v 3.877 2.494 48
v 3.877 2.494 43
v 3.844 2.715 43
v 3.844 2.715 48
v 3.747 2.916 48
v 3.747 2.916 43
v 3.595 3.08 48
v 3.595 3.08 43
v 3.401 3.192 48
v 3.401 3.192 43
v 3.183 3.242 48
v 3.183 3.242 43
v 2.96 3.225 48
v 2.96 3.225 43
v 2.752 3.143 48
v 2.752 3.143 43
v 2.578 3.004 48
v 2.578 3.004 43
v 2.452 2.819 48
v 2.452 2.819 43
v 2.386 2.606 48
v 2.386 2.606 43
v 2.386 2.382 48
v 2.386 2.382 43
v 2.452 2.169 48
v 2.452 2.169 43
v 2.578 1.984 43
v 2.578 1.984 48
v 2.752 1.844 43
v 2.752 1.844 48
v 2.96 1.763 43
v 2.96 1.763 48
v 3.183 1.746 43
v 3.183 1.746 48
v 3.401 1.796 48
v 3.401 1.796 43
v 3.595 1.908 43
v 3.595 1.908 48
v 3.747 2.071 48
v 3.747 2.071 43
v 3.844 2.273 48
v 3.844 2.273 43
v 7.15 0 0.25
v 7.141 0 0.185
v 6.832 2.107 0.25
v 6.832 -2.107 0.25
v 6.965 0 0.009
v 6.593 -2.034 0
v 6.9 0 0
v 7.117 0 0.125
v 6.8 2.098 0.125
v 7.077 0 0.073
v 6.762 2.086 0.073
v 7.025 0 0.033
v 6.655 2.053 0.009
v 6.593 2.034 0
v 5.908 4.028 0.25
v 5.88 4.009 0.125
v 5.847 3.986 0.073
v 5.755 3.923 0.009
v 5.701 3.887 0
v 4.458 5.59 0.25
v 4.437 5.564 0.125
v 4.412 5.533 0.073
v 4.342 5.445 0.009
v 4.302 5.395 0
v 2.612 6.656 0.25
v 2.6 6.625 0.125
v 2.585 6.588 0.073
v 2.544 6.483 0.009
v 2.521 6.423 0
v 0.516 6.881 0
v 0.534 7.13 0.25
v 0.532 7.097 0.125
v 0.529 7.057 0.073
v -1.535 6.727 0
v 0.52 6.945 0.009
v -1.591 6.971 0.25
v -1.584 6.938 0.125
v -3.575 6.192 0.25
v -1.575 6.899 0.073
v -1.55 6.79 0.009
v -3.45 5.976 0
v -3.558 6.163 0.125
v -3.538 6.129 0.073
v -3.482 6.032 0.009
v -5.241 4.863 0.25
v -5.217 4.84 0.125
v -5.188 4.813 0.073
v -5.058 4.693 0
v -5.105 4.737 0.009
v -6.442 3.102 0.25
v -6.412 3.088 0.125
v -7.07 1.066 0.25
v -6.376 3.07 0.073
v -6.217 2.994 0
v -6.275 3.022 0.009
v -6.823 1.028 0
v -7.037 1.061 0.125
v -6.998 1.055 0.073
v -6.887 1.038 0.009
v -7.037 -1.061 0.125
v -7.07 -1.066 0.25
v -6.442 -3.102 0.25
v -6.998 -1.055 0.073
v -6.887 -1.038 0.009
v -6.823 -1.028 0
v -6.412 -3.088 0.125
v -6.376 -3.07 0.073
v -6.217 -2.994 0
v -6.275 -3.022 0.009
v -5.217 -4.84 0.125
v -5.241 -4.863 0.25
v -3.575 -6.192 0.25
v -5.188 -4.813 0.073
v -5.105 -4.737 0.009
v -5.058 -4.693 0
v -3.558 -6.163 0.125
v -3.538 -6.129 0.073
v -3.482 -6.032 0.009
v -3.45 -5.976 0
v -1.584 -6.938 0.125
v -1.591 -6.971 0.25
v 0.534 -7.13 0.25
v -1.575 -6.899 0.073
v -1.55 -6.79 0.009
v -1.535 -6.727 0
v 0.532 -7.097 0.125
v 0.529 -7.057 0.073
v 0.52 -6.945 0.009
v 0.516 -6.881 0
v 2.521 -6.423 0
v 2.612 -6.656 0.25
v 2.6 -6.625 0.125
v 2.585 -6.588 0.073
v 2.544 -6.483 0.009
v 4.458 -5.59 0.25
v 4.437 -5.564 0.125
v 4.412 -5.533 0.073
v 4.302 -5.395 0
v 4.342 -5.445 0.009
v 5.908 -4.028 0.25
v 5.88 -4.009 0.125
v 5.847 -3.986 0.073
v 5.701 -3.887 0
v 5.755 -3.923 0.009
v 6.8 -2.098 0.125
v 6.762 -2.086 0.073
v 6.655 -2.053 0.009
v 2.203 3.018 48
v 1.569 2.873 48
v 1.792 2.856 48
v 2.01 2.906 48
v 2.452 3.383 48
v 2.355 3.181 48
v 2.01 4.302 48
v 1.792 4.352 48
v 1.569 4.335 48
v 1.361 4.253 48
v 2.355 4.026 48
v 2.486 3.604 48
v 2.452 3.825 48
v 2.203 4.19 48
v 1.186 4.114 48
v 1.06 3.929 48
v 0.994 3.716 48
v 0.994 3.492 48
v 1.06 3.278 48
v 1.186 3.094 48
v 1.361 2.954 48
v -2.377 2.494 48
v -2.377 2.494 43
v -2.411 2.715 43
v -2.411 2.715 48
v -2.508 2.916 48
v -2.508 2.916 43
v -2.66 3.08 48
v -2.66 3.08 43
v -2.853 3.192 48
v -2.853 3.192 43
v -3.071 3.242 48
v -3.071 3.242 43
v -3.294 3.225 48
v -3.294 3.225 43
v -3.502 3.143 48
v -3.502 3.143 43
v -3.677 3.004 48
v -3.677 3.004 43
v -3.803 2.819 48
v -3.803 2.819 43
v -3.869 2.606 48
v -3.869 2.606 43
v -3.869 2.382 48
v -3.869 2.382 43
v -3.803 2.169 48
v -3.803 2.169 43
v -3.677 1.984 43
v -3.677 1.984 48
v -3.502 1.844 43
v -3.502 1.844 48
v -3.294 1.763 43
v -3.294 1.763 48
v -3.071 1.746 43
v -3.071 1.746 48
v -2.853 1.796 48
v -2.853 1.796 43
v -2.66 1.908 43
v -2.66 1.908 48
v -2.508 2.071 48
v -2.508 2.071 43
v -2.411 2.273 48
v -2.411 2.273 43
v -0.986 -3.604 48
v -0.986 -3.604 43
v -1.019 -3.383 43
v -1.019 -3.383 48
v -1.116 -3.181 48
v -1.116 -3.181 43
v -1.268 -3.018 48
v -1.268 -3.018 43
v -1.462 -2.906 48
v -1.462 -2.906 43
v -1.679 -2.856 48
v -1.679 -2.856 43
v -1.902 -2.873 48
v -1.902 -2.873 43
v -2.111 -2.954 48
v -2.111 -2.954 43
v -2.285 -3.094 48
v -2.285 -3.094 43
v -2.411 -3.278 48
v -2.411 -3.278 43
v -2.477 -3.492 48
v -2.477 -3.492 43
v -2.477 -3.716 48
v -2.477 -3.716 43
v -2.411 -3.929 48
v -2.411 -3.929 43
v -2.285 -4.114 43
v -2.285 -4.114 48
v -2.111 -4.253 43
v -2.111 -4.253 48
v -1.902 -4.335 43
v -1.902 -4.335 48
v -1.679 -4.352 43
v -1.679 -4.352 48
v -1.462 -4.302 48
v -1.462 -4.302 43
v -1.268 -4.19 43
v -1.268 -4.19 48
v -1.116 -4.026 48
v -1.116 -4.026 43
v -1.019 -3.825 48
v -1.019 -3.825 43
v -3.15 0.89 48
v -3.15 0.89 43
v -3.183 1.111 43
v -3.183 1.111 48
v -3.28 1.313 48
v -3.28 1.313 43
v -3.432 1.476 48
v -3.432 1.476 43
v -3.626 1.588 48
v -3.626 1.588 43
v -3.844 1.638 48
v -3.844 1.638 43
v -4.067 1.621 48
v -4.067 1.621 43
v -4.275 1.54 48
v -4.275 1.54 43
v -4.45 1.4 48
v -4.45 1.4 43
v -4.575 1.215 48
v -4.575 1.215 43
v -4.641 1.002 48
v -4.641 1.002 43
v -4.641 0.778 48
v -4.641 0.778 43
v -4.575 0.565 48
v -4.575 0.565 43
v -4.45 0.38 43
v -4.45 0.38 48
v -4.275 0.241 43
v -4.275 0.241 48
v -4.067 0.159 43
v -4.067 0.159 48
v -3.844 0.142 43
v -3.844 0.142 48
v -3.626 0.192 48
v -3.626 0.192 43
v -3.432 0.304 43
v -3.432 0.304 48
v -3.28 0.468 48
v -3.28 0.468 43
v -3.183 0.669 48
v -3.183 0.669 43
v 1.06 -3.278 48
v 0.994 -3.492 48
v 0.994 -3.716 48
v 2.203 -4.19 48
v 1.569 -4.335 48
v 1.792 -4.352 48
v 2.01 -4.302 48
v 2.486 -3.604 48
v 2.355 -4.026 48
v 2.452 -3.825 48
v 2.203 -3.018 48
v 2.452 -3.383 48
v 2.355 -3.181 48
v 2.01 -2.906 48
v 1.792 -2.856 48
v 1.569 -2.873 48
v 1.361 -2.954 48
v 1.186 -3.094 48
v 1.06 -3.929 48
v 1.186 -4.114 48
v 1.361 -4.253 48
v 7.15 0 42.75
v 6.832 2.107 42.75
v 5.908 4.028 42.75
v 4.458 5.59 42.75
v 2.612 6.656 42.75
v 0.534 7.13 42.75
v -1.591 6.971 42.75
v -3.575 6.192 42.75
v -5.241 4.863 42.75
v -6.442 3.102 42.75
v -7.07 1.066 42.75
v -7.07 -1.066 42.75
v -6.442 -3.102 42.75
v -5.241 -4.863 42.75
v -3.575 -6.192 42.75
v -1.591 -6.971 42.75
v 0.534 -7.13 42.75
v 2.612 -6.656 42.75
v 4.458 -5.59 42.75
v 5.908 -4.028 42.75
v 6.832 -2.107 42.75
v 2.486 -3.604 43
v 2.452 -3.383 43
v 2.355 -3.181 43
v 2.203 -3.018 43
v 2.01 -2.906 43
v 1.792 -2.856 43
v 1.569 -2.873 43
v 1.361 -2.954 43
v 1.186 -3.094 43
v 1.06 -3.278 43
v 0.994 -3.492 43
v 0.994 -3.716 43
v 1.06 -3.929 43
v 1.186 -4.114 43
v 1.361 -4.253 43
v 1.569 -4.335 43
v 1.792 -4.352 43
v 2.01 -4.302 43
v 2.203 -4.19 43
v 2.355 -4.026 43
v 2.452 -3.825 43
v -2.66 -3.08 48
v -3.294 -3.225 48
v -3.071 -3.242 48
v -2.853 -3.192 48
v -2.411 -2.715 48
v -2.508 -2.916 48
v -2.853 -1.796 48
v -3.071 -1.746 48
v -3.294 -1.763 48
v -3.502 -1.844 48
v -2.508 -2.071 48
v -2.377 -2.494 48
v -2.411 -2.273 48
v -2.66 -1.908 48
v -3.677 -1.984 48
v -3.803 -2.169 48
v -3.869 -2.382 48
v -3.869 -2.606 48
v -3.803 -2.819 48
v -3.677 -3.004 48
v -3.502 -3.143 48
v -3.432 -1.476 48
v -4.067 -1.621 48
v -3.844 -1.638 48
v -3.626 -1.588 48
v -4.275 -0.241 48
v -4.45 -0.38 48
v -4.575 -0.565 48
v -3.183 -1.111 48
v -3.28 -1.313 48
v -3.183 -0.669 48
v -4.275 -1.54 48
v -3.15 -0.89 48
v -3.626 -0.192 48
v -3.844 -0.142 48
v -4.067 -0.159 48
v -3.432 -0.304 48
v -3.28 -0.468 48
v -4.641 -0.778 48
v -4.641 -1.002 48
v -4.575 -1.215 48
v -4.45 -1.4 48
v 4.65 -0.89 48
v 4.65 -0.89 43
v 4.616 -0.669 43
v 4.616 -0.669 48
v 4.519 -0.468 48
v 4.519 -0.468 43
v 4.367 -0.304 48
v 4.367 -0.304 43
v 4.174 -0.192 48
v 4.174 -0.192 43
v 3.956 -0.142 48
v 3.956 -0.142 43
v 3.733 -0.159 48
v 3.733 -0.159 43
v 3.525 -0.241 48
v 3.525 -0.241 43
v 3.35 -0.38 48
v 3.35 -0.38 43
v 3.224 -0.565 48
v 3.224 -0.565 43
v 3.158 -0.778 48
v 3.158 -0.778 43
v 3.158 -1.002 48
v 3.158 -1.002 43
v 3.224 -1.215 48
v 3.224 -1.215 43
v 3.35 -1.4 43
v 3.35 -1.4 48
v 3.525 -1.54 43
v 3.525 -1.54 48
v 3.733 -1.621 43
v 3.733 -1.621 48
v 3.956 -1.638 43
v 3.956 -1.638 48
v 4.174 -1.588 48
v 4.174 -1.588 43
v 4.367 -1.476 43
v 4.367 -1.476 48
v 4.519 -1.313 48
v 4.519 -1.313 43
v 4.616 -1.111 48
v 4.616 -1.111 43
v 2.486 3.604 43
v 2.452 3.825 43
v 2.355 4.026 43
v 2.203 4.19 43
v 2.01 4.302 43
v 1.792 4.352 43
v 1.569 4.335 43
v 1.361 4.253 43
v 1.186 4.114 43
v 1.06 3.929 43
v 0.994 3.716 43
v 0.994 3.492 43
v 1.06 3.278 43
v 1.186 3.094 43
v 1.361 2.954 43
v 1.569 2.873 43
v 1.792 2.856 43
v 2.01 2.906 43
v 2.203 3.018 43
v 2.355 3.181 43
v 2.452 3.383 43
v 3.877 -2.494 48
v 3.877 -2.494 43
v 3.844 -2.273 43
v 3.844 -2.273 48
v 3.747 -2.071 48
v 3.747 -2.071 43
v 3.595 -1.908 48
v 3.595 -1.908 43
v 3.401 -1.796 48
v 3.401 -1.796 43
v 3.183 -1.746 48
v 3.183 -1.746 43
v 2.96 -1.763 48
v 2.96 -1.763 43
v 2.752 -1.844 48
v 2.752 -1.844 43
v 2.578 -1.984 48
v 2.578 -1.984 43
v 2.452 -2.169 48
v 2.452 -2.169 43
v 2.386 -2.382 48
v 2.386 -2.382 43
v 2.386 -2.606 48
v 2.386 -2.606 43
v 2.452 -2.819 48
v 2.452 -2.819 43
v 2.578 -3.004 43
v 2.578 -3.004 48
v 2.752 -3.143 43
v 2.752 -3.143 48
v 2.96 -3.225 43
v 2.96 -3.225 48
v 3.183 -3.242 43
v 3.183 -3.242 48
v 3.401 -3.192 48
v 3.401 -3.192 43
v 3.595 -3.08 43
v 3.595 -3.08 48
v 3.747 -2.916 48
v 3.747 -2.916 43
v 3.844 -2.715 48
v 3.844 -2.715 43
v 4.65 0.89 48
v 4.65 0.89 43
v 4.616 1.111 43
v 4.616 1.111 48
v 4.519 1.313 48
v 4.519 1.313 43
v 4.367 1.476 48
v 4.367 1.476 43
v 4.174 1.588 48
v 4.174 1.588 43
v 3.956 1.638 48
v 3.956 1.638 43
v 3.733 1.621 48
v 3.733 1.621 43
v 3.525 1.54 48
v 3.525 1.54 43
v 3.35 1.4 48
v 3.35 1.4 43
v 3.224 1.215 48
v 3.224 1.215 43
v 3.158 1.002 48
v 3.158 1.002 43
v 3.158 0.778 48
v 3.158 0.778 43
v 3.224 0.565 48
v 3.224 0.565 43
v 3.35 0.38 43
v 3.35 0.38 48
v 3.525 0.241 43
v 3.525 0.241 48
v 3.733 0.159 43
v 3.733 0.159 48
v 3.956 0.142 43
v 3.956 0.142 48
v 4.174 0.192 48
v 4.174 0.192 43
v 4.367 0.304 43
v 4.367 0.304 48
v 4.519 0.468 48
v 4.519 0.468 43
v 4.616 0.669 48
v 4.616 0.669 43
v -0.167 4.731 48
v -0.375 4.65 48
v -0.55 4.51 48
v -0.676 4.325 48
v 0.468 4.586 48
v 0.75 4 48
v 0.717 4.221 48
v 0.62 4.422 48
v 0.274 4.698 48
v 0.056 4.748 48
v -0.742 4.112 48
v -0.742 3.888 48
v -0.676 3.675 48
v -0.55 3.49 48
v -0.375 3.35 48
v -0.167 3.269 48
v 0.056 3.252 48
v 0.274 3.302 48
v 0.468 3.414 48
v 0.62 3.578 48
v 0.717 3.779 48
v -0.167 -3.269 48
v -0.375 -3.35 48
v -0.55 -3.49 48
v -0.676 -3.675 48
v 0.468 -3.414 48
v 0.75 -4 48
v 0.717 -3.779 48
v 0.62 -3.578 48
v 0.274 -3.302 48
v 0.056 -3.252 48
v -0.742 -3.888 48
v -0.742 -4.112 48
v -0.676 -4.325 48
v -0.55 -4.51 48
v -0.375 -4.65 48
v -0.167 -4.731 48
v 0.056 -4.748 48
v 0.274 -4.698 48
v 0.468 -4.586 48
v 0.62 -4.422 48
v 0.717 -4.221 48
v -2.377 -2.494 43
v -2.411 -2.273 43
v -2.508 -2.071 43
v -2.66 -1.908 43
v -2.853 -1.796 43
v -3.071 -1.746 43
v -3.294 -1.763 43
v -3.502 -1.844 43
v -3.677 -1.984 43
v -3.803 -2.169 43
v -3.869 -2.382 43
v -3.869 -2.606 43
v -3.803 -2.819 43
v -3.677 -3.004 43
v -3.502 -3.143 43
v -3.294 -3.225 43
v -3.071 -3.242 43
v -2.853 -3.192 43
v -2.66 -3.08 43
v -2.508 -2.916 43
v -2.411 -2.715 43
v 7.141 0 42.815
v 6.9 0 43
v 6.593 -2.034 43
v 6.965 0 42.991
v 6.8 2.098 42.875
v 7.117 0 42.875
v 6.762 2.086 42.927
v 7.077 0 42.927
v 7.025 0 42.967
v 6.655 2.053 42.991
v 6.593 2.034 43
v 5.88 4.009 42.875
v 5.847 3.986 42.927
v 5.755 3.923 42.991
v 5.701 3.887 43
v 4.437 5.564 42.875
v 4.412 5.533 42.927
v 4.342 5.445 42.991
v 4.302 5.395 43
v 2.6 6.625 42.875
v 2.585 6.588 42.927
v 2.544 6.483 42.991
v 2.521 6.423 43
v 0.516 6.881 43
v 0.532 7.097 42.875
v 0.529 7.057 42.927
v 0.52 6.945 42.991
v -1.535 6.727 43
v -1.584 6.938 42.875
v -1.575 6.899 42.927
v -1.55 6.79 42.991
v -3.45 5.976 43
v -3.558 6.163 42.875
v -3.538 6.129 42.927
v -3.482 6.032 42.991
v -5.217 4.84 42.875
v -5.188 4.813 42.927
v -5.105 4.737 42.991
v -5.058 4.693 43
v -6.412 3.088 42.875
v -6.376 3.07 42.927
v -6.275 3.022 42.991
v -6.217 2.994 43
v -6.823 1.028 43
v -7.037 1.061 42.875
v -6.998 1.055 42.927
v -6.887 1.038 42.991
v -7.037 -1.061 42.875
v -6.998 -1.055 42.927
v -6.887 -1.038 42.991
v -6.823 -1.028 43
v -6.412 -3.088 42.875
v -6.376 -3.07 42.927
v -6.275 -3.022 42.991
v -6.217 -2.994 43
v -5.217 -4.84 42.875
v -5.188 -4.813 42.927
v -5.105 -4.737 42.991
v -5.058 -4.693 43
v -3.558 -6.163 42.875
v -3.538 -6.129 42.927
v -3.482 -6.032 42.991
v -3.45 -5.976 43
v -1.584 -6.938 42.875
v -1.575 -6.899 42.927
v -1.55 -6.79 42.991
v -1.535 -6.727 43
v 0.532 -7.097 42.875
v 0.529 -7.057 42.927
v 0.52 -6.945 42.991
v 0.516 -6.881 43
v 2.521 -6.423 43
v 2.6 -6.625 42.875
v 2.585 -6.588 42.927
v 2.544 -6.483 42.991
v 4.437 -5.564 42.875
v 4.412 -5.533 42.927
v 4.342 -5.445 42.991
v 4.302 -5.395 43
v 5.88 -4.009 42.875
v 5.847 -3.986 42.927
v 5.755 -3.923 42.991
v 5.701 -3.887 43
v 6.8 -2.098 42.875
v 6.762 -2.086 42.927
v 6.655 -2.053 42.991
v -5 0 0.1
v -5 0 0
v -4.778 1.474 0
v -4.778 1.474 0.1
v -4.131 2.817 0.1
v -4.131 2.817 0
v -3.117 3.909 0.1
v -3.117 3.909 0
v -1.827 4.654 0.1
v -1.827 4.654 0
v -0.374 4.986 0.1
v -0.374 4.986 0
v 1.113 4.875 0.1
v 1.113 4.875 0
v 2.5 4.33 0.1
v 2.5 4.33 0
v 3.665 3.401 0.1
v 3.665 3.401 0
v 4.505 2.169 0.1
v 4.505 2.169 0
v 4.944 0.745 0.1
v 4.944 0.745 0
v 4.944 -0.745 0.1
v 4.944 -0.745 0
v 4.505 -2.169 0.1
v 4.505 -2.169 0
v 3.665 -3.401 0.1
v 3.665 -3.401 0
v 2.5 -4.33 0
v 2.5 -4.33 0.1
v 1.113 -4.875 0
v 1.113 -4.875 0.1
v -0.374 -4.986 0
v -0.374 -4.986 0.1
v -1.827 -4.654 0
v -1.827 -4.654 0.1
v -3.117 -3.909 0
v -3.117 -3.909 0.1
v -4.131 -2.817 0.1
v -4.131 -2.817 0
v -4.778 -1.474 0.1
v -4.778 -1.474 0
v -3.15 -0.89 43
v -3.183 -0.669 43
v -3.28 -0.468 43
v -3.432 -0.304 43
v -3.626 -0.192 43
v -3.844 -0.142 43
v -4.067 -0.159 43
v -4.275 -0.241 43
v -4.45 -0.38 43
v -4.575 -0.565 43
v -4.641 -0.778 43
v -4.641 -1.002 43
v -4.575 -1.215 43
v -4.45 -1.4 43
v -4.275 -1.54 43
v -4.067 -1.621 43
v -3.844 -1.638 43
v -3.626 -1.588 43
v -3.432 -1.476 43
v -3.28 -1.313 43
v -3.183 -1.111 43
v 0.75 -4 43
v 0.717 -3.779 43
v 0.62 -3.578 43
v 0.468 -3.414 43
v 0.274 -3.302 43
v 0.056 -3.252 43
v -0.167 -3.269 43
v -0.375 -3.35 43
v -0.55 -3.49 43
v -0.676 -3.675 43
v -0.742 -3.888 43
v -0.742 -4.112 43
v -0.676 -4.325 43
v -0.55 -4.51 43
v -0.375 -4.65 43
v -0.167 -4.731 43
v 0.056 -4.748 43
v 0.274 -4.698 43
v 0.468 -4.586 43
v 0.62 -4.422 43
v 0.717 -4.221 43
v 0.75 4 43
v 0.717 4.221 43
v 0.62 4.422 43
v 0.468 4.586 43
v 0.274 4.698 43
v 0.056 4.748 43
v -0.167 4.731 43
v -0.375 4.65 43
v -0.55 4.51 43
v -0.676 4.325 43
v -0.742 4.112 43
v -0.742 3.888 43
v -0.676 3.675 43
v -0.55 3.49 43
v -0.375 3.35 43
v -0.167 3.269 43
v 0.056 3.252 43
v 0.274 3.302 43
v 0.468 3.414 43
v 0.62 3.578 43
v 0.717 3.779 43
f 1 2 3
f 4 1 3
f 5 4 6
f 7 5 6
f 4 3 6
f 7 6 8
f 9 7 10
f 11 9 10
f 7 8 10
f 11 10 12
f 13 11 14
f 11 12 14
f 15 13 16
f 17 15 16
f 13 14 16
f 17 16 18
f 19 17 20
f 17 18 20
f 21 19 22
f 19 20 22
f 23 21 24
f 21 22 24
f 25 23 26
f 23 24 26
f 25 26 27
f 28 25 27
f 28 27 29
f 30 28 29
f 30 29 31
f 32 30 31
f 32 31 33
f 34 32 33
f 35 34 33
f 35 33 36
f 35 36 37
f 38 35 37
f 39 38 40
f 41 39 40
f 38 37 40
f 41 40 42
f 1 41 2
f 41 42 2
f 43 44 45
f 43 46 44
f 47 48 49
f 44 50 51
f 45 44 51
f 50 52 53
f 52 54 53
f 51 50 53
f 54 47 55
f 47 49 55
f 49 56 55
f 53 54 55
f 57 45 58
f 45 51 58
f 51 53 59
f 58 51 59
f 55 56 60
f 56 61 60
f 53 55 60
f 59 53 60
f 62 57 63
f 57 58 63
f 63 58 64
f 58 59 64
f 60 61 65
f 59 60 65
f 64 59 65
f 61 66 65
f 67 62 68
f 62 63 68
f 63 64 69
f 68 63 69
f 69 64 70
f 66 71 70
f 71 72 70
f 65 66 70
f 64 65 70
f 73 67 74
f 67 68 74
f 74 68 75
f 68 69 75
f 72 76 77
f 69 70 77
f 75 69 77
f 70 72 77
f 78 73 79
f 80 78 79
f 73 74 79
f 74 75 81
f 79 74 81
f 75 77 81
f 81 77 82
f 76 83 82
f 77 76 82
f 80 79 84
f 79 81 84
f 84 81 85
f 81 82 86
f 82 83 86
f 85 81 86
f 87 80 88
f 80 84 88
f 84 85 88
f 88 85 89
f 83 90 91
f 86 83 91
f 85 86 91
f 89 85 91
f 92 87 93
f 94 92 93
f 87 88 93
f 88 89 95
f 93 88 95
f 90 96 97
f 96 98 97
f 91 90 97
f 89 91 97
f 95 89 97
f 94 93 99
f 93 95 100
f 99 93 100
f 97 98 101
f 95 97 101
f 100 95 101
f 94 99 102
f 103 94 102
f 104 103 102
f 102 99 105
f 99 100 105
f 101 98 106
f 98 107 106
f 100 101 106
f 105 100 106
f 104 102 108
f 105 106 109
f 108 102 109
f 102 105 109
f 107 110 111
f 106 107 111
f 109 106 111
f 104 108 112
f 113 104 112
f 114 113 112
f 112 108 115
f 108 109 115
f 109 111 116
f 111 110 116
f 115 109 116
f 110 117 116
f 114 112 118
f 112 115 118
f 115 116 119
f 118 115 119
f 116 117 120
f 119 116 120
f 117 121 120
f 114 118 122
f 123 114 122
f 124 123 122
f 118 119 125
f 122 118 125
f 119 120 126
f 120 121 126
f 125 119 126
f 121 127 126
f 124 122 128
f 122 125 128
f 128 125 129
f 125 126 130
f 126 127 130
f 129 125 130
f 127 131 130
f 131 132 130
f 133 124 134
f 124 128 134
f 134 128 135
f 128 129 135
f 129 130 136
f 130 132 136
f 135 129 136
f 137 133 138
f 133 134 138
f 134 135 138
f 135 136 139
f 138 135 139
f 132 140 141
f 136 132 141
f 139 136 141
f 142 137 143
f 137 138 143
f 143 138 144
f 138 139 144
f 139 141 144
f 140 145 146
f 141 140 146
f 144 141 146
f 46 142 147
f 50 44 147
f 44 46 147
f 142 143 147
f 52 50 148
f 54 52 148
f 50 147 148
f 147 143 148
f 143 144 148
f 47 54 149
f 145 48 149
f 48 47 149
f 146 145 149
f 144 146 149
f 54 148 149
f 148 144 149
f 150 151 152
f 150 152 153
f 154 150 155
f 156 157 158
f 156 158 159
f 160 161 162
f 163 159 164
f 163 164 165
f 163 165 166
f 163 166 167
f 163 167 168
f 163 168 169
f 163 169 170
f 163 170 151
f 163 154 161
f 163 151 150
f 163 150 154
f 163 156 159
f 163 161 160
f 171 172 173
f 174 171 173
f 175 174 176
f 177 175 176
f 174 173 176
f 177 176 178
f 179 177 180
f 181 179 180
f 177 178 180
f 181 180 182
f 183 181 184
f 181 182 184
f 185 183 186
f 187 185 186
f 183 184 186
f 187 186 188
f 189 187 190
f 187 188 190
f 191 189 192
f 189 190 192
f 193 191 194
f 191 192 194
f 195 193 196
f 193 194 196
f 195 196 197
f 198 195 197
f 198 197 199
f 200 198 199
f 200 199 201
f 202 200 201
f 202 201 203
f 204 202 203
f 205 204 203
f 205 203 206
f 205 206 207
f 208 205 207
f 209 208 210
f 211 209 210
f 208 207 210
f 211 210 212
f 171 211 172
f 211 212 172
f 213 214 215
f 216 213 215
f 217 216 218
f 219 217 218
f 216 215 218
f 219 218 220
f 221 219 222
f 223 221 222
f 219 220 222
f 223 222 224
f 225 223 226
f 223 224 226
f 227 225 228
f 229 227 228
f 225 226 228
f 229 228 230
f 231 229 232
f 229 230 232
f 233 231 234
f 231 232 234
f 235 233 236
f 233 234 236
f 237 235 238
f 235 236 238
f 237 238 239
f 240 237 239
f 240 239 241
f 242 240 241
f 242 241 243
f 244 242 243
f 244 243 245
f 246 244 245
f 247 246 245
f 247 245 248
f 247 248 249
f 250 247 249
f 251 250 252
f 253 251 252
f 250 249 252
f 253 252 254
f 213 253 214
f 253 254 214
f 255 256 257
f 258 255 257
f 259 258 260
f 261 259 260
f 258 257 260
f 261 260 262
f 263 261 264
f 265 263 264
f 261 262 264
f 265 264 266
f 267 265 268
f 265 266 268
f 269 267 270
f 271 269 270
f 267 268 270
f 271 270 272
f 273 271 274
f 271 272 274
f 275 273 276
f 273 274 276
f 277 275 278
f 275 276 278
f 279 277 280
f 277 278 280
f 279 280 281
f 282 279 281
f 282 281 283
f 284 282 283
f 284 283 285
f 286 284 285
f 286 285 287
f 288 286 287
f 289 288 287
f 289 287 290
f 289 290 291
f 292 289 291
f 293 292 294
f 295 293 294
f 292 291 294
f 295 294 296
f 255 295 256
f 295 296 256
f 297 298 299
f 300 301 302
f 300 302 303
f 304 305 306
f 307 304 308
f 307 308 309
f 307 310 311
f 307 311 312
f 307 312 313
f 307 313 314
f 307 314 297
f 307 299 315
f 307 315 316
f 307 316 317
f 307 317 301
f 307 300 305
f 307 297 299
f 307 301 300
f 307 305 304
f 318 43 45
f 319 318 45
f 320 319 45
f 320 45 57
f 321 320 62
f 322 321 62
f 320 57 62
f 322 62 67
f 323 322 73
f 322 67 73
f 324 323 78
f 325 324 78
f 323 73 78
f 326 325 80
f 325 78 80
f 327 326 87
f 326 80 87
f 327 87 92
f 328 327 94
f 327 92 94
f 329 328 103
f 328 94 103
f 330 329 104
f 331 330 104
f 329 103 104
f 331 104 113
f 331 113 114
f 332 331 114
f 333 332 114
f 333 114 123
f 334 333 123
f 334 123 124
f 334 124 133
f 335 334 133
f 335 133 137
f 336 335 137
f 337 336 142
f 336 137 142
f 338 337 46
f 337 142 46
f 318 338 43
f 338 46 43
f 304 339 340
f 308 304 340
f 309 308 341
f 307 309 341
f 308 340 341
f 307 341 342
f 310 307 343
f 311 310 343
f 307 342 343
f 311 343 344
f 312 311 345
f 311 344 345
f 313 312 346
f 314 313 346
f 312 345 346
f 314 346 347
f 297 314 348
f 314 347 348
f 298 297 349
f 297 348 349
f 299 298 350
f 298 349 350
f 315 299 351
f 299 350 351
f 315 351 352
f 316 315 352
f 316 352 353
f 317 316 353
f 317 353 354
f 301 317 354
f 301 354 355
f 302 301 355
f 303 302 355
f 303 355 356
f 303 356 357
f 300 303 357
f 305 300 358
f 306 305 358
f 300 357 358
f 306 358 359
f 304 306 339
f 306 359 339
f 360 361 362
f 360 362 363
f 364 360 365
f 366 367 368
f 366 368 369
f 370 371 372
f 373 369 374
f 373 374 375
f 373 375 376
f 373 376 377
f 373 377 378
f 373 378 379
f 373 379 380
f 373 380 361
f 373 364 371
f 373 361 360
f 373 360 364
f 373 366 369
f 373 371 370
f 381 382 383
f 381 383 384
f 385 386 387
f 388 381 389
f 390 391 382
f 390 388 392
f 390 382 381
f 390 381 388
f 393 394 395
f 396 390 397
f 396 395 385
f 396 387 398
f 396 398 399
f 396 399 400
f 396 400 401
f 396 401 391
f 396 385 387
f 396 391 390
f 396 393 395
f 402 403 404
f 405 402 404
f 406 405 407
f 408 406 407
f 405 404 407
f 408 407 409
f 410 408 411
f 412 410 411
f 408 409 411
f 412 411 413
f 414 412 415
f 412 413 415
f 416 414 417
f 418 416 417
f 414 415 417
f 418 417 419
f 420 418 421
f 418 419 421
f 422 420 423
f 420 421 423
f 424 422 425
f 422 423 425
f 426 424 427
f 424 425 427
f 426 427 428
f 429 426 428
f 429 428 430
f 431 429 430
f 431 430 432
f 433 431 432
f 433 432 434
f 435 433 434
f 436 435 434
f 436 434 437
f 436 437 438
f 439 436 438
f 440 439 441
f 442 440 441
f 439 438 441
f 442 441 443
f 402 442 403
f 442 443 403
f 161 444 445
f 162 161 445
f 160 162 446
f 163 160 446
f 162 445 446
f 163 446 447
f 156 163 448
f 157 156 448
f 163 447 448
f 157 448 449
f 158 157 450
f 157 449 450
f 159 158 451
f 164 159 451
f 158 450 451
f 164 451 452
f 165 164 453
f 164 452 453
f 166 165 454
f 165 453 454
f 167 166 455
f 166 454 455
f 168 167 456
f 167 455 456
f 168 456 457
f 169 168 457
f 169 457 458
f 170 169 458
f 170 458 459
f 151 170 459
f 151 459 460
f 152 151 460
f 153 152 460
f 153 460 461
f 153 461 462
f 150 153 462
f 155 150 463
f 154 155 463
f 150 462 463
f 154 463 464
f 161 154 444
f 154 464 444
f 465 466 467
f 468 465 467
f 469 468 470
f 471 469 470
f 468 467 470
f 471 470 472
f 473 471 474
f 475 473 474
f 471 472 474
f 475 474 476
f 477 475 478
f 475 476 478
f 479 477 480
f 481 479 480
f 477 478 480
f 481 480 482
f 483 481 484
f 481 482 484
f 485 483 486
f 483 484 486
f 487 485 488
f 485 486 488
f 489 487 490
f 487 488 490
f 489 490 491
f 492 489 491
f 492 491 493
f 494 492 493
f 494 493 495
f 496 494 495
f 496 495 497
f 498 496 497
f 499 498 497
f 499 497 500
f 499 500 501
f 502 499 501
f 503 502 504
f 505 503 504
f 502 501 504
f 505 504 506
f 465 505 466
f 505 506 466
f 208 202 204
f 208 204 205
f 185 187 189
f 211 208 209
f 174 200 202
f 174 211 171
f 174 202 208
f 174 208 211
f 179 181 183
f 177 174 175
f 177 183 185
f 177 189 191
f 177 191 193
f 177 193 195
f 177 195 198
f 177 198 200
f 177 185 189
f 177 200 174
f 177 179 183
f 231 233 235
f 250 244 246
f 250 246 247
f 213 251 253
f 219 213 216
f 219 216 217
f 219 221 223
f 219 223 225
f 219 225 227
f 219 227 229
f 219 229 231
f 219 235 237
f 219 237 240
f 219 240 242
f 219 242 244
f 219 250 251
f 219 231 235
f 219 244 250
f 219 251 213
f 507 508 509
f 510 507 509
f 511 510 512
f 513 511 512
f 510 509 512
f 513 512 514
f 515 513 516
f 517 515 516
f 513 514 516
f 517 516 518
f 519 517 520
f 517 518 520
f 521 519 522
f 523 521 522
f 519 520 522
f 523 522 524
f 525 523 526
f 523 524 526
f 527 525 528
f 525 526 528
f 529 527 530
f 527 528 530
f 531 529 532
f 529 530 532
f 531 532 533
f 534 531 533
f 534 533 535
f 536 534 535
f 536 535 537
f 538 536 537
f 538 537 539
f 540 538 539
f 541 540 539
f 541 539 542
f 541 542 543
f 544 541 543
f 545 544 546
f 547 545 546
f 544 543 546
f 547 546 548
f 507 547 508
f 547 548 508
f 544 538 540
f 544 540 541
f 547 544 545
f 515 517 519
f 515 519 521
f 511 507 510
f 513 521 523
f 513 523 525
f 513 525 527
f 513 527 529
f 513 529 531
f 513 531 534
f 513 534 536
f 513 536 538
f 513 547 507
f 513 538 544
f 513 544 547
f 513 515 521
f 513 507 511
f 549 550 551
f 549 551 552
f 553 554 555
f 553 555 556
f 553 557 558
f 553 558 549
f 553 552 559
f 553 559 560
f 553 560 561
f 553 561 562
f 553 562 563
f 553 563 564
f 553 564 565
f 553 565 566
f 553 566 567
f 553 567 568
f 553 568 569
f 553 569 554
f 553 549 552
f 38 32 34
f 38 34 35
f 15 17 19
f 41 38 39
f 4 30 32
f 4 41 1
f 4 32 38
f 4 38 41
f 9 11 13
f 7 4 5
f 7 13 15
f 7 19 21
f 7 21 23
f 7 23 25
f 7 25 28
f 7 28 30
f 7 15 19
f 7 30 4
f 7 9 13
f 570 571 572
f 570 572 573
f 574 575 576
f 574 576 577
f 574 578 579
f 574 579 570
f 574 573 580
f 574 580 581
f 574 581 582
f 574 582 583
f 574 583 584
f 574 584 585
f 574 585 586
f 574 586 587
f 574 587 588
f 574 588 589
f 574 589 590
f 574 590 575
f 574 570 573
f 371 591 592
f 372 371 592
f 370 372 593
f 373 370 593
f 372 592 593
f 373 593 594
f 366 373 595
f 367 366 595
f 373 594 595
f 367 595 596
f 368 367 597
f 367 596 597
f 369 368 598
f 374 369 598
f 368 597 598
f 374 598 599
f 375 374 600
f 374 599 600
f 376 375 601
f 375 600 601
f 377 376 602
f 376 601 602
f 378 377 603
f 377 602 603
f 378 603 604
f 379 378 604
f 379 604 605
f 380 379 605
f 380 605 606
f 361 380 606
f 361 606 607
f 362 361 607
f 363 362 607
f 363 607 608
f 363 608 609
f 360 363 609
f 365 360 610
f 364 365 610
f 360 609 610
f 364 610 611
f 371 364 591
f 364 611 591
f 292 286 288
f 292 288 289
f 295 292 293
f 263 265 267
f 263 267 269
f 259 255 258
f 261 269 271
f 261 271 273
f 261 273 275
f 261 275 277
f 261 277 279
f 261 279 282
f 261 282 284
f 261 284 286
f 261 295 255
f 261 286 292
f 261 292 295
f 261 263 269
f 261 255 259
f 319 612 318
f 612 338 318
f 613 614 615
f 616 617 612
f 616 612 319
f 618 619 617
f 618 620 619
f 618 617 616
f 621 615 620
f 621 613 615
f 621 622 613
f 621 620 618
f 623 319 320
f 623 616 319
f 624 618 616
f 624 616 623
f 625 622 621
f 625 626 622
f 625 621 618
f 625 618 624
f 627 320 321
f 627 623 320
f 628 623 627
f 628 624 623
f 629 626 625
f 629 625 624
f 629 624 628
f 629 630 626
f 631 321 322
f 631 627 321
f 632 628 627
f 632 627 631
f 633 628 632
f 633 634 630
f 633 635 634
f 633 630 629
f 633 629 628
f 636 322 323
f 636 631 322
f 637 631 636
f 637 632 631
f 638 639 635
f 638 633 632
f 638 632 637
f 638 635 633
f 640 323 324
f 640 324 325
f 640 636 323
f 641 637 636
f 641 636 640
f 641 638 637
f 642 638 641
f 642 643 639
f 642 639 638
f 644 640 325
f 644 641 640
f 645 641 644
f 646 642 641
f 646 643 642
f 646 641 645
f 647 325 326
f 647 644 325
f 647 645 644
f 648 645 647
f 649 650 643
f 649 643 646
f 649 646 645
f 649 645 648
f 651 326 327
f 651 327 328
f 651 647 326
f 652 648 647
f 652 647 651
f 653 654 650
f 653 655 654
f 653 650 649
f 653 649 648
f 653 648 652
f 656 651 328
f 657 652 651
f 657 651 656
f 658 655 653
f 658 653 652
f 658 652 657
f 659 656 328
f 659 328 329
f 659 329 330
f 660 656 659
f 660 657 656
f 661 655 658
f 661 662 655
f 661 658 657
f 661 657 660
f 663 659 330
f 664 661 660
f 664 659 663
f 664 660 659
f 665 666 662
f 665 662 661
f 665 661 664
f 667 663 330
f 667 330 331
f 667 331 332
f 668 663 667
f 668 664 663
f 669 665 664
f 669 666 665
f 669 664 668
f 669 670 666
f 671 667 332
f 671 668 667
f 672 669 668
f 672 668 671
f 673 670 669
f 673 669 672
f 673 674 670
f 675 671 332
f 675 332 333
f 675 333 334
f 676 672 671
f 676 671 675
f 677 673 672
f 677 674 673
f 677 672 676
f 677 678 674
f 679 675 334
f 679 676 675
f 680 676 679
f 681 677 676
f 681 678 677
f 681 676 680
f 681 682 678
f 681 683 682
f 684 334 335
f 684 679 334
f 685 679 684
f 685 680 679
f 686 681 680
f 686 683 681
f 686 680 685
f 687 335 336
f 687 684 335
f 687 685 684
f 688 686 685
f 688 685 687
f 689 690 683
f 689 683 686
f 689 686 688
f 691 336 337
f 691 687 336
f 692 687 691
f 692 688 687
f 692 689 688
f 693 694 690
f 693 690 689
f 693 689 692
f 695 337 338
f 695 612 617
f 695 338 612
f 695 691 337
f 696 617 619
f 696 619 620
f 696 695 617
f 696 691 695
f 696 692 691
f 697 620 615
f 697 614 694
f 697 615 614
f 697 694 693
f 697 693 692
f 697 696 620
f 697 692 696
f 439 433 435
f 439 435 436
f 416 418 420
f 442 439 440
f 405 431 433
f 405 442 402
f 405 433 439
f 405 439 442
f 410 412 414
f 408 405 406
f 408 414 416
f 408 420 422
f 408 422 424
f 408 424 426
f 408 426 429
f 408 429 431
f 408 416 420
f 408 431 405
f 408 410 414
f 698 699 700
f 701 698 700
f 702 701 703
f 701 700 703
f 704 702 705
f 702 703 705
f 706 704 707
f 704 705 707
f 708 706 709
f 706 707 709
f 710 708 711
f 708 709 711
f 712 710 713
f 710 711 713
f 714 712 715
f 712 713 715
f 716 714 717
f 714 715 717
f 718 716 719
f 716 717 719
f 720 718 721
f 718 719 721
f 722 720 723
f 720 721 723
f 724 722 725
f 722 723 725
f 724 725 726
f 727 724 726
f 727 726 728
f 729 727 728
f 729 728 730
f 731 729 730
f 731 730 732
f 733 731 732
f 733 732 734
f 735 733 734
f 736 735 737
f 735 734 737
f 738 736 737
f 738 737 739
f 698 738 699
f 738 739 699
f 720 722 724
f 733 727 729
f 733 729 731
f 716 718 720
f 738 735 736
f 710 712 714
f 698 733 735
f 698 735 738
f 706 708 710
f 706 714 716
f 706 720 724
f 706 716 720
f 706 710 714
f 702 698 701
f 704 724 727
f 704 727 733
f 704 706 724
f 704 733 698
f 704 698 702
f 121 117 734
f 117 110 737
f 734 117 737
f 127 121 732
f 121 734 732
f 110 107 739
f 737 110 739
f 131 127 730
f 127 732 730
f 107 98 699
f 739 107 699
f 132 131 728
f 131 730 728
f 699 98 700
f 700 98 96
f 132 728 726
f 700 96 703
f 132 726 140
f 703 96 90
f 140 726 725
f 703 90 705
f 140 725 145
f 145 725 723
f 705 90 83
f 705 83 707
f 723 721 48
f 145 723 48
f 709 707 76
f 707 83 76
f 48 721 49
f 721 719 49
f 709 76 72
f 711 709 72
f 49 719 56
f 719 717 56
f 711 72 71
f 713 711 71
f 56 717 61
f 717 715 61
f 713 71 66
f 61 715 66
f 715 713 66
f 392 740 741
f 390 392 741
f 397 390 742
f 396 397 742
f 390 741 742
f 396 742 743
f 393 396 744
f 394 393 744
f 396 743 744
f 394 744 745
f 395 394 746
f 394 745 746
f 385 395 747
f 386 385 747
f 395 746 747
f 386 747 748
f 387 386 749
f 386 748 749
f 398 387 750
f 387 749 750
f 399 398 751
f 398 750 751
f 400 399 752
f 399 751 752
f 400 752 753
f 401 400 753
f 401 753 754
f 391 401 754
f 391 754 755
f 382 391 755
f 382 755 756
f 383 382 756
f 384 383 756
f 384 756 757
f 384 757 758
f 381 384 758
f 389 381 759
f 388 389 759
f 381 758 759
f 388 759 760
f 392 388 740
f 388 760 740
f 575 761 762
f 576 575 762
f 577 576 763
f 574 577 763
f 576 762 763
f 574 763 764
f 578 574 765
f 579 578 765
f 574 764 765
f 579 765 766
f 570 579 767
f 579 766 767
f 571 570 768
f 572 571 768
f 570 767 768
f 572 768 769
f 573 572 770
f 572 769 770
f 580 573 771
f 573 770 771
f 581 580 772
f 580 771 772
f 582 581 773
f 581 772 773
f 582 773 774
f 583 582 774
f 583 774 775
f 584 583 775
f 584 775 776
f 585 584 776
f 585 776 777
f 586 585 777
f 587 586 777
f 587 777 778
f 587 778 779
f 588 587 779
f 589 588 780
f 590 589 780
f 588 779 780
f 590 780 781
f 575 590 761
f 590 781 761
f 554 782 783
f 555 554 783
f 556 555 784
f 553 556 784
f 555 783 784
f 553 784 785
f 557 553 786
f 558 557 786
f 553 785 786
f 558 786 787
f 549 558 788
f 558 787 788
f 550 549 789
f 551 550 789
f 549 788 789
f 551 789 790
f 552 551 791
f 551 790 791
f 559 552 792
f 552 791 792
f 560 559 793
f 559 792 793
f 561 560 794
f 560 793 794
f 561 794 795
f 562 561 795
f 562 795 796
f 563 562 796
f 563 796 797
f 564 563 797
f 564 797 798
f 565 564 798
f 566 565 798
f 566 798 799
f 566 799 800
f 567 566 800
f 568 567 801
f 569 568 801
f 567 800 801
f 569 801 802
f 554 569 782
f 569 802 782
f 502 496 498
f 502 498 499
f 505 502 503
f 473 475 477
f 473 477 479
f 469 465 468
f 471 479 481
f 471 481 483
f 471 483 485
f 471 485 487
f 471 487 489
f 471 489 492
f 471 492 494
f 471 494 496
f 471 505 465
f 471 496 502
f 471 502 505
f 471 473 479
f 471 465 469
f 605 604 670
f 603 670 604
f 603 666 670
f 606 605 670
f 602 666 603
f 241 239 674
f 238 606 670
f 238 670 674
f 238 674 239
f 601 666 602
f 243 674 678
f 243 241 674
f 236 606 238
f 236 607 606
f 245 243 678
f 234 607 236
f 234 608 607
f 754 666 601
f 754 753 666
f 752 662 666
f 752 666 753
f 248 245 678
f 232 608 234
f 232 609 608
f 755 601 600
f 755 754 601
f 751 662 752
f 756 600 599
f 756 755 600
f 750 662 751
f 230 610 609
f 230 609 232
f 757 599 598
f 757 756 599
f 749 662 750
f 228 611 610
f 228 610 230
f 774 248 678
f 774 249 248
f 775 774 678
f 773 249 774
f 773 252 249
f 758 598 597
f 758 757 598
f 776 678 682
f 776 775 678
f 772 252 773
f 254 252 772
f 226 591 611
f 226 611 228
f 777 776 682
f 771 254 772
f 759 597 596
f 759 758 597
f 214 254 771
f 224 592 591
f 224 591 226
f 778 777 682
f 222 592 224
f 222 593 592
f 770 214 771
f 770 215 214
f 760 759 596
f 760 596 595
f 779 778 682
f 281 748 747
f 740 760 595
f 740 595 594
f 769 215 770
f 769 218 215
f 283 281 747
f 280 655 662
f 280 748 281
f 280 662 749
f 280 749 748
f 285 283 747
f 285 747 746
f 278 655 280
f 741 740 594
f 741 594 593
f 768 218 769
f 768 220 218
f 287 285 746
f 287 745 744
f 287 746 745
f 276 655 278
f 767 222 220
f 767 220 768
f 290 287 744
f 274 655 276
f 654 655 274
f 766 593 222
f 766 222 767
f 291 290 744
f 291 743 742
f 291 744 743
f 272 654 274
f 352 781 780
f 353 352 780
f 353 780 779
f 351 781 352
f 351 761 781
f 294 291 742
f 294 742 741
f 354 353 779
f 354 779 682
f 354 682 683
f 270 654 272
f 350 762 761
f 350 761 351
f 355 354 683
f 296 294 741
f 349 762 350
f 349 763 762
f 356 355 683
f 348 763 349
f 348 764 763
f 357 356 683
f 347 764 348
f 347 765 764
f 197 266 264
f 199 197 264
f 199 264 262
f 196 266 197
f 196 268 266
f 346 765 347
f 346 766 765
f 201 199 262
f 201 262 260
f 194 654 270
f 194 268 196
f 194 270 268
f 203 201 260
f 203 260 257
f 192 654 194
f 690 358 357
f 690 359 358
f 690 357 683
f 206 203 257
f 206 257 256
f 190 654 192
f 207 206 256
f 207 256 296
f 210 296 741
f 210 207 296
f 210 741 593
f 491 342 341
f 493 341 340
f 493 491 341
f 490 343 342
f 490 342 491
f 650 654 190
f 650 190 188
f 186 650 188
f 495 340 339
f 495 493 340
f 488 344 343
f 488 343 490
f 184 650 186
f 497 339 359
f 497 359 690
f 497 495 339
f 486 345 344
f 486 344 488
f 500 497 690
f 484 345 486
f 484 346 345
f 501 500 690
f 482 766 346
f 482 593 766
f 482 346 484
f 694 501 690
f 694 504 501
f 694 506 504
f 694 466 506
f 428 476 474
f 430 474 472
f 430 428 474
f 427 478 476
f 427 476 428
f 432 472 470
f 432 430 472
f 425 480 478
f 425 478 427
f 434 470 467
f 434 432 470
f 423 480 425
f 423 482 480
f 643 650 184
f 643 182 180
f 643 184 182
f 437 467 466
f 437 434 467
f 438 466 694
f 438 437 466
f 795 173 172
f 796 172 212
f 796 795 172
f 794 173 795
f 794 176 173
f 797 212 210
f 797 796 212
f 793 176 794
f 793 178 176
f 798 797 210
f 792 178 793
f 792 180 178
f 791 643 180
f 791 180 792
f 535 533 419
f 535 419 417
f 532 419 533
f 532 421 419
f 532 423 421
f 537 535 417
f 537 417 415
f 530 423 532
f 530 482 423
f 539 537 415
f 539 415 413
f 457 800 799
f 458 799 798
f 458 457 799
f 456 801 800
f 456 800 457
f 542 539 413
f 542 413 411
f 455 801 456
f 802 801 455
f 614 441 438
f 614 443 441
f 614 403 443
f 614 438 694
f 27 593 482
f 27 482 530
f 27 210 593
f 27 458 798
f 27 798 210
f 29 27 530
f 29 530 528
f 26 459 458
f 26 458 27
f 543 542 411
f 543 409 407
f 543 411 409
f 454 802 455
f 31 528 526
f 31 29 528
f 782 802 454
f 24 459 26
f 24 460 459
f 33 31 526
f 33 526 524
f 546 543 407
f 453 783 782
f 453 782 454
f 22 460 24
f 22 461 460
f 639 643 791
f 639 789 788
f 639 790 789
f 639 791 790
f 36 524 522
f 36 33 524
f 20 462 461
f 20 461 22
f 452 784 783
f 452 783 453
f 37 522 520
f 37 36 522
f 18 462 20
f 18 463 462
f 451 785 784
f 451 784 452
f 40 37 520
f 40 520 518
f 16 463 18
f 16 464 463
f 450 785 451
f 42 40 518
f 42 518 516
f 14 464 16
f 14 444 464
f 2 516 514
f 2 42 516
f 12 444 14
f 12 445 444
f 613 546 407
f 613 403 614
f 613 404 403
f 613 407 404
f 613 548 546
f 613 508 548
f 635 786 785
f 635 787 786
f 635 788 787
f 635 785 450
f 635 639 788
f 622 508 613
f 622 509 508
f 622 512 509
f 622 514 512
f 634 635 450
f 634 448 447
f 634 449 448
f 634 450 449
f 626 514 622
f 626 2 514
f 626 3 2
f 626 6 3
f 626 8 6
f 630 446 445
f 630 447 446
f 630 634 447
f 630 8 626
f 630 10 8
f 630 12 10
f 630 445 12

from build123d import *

# Parameters (mm, degrees)
SKETCH1_R           = 7.15
BOSS_EXTRUDE1_DEPTH = 43
SKETCH2_R           = 5
CUT_EXTRUDE1_DEPTH  = 0.1
SKETCH3_R           = 0.75
BOSS_EXTRUDE2_DEPTH = 5
FILLET1_R           = 0.25


with BuildPart() as part:
    # Sketch1 → Boss-Extrude1 (new body)
    with BuildSketch(Plane.XY):
        Circle(SKETCH1_R)
    extrude(amount=BOSS_EXTRUDE1_DEPTH)

    # Sketch2 → Cut-Extrude1 (cut)
    with BuildSketch(Plane(origin=(0, 0, 0), x_dir=(-1, 0, 0), z_dir=(0, 0, -1))):
        Circle(SKETCH2_R)
    extrude(amount=-CUT_EXTRUDE1_DEPTH, mode=Mode.SUBTRACT)

    # Sketch3 → Boss-Extrude2 (add)
    with BuildSketch(Plane.XY.offset(43)):
        with Locations((0, 4)):
            Circle(SKETCH3_R)
        with Locations((1.735534956, 3.603875472)):
            Circle(SKETCH3_R)
        with Locations((3.12732593, 2.493959207)):
            Circle(SKETCH3_R)
        with Locations((3.899711649, 0.890083736)):
            Circle(SKETCH3_R)
        with Locations((3.899711649, -0.890083736)):
            Circle(SKETCH3_R)
        with Locations((3.12732593, -2.493959207)):
            Circle(SKETCH3_R)
        with Locations((1.735534956, -3.603875472)):
            Circle(SKETCH3_R)
        with Locations((0, -4)):
            Circle(SKETCH3_R)
        with Locations((-1.735534956, -3.603875472)):
            Circle(SKETCH3_R)
        with Locations((-3.12732593, -2.493959207)):
            Circle(SKETCH3_R)
        with Locations((-3.899711649, -0.890083736)):
            Circle(SKETCH3_R)
        with Locations((-3.899711649, 0.890083736)):
            Circle(SKETCH3_R)
        with Locations((-3.12732593, 2.493959207)):
            Circle(SKETCH3_R)
    extrude(amount=BOSS_EXTRUDE2_DEPTH)

    # Fillet1
    fillet1_edges = [part.edges().sort_by_distance(p)[0] for p in [
        (-7.15, 0, 0),
        (-7.15, 0, 43),
    ]]
    fillet(fillet1_edges, radius=FILLET1_R)


solid = part.part
